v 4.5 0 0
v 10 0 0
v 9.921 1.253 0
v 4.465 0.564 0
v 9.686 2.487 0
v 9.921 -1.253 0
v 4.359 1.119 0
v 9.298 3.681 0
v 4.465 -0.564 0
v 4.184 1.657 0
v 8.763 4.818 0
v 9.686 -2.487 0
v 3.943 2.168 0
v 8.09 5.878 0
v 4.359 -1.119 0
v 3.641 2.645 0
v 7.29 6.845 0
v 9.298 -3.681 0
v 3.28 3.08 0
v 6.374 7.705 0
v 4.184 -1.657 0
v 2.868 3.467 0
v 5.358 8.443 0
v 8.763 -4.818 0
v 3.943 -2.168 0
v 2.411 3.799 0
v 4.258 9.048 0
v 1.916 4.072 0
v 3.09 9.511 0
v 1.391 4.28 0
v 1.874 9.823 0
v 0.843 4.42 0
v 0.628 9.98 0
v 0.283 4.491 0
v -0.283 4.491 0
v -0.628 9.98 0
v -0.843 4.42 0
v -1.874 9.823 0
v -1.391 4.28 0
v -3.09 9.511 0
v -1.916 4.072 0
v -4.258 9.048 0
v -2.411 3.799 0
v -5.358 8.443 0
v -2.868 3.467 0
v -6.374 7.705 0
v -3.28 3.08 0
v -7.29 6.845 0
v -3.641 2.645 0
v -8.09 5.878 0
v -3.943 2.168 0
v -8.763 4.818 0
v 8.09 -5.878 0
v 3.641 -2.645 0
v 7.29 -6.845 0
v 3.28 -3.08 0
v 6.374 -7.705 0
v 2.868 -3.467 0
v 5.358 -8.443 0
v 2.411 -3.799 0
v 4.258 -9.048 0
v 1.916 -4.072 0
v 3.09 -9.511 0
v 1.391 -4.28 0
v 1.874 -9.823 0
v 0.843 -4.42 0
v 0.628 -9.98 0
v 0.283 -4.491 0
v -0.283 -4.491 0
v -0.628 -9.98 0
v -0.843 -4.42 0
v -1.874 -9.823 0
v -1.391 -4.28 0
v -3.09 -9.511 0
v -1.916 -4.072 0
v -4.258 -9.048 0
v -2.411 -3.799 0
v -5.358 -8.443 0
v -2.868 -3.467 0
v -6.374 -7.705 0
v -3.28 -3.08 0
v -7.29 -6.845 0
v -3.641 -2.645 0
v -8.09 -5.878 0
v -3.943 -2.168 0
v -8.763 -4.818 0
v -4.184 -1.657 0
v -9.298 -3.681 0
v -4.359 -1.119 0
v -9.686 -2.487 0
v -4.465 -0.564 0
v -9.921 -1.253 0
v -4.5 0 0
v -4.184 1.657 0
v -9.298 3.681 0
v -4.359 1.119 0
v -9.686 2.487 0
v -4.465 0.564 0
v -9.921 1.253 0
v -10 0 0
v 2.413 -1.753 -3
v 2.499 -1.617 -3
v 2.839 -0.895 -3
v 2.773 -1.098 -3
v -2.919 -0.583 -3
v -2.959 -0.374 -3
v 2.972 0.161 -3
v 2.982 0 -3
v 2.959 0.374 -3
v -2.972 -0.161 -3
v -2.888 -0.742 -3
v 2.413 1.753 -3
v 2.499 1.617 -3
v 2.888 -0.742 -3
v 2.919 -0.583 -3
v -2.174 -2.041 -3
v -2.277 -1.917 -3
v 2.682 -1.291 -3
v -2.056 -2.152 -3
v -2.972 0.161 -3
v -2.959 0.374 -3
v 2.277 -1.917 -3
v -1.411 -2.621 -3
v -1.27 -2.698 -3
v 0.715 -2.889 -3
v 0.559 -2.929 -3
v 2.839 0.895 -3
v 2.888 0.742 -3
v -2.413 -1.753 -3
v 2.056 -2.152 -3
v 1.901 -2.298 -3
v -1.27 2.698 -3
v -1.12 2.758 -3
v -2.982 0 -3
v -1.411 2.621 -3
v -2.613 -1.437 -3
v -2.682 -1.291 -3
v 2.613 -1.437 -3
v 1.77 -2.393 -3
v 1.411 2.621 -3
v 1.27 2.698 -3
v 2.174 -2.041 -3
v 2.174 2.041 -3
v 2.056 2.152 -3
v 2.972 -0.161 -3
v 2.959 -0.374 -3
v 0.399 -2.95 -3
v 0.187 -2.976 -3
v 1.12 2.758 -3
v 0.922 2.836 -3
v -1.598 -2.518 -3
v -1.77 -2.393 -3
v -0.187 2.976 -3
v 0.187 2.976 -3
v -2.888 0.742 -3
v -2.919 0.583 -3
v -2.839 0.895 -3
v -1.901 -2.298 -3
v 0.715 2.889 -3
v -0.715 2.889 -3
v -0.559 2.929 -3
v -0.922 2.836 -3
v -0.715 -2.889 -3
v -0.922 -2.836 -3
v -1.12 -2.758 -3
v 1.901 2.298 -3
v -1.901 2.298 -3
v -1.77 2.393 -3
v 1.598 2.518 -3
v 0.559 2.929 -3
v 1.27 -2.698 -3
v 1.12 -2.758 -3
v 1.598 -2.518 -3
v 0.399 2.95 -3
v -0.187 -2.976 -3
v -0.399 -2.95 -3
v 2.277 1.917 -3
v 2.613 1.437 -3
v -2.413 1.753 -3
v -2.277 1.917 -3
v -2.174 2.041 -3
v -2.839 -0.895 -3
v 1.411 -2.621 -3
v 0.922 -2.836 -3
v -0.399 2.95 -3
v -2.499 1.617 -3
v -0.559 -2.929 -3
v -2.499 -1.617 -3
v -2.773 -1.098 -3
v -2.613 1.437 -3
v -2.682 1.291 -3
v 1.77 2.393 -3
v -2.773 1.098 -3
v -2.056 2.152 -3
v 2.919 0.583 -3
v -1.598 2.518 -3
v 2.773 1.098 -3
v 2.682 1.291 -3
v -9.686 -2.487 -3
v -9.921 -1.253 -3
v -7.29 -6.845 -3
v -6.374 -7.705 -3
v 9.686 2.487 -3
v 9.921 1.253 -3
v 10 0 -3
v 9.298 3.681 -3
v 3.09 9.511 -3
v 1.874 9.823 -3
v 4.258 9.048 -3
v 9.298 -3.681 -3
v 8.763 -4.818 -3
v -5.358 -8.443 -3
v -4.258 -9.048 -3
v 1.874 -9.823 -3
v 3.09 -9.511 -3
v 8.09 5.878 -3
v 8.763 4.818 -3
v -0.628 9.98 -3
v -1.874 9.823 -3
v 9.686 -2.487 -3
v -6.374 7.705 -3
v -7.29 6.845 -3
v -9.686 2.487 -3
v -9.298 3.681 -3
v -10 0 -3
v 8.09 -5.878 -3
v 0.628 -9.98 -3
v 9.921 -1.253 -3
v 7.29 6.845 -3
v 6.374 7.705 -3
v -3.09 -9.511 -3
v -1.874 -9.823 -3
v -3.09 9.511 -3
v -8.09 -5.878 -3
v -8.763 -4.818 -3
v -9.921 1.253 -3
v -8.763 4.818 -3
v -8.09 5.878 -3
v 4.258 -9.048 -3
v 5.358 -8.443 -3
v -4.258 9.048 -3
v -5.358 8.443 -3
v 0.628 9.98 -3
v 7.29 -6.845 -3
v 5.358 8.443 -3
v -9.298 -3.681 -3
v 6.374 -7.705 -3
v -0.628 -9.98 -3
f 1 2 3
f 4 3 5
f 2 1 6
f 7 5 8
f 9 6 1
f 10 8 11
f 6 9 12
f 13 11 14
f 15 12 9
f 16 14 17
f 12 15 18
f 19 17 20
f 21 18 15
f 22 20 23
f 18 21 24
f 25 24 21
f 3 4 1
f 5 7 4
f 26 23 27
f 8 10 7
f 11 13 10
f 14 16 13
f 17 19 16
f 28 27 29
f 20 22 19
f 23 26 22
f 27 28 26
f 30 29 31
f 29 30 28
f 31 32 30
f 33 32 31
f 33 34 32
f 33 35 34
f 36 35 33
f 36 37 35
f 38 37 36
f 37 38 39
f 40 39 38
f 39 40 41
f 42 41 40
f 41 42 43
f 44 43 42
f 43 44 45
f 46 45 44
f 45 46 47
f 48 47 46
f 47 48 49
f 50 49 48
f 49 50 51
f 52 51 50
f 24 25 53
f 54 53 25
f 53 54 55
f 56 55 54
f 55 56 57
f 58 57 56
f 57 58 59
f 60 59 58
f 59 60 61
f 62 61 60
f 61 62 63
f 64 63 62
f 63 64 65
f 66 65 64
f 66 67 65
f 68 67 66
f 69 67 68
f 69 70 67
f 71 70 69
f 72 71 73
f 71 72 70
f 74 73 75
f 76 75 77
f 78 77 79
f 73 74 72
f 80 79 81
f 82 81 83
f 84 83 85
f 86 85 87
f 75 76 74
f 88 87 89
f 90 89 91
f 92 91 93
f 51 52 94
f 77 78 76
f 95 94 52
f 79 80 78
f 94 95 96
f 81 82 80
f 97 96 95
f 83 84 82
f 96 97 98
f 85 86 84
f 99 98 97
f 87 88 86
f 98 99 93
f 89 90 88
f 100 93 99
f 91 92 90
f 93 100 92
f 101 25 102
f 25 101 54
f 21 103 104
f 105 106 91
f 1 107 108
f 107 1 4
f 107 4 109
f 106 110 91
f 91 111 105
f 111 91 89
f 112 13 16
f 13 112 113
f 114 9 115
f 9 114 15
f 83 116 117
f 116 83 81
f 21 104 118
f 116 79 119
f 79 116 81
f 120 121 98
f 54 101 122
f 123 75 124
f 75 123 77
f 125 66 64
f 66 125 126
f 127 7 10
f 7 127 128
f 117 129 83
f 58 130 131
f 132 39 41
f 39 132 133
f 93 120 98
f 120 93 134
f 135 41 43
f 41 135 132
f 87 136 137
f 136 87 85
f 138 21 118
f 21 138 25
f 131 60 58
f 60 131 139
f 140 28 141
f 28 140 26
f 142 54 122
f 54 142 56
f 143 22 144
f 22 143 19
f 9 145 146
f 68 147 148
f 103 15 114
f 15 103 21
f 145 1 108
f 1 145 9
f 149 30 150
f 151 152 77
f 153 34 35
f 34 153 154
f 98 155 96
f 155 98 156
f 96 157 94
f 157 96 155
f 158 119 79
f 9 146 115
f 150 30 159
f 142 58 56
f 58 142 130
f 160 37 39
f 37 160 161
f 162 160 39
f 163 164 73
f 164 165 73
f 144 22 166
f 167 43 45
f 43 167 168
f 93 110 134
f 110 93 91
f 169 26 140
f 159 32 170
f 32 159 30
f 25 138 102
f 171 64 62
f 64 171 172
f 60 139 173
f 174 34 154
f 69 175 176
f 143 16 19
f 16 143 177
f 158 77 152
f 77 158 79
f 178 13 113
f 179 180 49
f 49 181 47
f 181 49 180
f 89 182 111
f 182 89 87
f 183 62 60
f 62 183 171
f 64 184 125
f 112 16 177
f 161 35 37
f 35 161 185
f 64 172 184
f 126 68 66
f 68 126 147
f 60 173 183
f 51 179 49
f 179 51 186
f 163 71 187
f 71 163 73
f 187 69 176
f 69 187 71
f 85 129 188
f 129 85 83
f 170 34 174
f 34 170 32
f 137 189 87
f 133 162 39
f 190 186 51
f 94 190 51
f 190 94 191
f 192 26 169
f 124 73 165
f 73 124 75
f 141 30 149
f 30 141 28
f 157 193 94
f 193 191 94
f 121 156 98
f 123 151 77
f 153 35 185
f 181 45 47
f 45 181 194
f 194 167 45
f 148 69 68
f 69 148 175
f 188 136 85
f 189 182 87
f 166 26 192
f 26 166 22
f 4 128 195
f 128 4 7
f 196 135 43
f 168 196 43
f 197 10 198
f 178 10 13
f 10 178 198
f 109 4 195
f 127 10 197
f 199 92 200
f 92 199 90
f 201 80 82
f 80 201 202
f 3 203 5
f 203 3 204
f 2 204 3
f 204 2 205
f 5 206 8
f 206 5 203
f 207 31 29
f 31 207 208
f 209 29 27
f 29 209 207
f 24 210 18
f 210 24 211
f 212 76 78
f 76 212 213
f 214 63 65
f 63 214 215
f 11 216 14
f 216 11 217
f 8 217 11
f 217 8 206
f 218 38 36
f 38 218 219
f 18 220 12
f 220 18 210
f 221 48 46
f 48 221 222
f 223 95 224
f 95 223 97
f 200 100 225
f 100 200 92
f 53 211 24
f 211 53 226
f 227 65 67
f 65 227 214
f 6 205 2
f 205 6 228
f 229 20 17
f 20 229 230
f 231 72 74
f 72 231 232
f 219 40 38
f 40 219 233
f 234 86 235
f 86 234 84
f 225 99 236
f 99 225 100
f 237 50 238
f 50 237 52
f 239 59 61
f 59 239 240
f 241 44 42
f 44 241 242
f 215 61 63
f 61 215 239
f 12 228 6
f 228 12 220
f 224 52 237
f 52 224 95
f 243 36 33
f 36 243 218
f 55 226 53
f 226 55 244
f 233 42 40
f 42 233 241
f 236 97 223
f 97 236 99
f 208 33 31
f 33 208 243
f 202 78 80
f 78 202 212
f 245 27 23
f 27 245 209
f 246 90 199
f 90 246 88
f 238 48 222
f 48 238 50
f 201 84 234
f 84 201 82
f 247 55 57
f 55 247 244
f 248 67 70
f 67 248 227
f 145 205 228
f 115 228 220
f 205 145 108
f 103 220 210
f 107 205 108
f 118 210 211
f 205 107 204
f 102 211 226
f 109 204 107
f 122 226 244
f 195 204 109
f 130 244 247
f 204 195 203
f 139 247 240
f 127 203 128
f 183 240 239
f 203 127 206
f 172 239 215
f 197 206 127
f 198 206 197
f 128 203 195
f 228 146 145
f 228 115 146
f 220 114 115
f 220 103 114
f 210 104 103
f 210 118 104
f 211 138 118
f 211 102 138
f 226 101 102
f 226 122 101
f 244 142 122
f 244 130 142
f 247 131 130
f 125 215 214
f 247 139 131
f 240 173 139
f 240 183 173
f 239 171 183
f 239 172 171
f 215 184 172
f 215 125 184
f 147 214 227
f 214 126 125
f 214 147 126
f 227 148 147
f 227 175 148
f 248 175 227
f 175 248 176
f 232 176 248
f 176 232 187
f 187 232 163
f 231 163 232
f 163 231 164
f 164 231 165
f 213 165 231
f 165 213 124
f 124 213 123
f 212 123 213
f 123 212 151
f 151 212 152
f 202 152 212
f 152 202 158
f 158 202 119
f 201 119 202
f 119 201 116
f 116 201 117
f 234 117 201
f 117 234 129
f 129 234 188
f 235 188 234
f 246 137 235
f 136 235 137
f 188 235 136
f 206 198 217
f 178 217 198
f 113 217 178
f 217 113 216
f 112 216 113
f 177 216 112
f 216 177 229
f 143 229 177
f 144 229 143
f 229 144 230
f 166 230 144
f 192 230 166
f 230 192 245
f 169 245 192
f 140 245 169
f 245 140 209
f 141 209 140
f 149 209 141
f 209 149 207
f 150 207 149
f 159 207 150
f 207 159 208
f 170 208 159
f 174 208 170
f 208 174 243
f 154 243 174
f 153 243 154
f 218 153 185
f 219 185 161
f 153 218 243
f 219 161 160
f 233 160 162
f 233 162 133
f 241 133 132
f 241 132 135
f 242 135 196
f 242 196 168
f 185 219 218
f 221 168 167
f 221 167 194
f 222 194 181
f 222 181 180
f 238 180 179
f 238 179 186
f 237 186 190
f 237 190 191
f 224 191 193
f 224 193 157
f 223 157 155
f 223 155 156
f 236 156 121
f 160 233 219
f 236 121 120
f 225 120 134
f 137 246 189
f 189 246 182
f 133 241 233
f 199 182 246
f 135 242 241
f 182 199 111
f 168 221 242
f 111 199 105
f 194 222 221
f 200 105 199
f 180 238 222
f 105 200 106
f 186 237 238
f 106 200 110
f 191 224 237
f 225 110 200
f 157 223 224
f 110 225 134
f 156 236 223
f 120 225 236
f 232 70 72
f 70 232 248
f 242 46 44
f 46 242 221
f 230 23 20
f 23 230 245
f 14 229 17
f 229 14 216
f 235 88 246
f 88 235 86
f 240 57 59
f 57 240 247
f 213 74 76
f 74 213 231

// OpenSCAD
$fn = 50;


difference() {
	union() {
		translate(v = [0, 0, -3.0000000000]) {
			cylinder(h = 3, r = 10.0000000000);
		}
		cylinder(h = 0, r = 19.0000000000);
	}
	union() {
		translate(v = [0, 0, 0]) {
			rotate(a = [0, 0, 0]) {
				difference() {
					union() {
						#translate(v = [0, 0, -3.0000000000]) {
							cylinder(h = 3, r = 2.2500000000);
						}
						#translate(v = [0, 0, -4.2000000000]) {
							cylinder(h = 4.2000000000, r = 10.0000000000, r1 = 2.3750000000, r2 = 4.5000000000);
						}
						#translate(v = [0, 0, -3.0000000000]) {
							cylinder(h = 3, r = 2.3750000000);
						}
						#translate(v = [0, 0, -3.0000000000]) {
							cylinder(h = 3, r = 2.2500000000);
						}
					}
					union();
				}
			}
		}
	}
}
